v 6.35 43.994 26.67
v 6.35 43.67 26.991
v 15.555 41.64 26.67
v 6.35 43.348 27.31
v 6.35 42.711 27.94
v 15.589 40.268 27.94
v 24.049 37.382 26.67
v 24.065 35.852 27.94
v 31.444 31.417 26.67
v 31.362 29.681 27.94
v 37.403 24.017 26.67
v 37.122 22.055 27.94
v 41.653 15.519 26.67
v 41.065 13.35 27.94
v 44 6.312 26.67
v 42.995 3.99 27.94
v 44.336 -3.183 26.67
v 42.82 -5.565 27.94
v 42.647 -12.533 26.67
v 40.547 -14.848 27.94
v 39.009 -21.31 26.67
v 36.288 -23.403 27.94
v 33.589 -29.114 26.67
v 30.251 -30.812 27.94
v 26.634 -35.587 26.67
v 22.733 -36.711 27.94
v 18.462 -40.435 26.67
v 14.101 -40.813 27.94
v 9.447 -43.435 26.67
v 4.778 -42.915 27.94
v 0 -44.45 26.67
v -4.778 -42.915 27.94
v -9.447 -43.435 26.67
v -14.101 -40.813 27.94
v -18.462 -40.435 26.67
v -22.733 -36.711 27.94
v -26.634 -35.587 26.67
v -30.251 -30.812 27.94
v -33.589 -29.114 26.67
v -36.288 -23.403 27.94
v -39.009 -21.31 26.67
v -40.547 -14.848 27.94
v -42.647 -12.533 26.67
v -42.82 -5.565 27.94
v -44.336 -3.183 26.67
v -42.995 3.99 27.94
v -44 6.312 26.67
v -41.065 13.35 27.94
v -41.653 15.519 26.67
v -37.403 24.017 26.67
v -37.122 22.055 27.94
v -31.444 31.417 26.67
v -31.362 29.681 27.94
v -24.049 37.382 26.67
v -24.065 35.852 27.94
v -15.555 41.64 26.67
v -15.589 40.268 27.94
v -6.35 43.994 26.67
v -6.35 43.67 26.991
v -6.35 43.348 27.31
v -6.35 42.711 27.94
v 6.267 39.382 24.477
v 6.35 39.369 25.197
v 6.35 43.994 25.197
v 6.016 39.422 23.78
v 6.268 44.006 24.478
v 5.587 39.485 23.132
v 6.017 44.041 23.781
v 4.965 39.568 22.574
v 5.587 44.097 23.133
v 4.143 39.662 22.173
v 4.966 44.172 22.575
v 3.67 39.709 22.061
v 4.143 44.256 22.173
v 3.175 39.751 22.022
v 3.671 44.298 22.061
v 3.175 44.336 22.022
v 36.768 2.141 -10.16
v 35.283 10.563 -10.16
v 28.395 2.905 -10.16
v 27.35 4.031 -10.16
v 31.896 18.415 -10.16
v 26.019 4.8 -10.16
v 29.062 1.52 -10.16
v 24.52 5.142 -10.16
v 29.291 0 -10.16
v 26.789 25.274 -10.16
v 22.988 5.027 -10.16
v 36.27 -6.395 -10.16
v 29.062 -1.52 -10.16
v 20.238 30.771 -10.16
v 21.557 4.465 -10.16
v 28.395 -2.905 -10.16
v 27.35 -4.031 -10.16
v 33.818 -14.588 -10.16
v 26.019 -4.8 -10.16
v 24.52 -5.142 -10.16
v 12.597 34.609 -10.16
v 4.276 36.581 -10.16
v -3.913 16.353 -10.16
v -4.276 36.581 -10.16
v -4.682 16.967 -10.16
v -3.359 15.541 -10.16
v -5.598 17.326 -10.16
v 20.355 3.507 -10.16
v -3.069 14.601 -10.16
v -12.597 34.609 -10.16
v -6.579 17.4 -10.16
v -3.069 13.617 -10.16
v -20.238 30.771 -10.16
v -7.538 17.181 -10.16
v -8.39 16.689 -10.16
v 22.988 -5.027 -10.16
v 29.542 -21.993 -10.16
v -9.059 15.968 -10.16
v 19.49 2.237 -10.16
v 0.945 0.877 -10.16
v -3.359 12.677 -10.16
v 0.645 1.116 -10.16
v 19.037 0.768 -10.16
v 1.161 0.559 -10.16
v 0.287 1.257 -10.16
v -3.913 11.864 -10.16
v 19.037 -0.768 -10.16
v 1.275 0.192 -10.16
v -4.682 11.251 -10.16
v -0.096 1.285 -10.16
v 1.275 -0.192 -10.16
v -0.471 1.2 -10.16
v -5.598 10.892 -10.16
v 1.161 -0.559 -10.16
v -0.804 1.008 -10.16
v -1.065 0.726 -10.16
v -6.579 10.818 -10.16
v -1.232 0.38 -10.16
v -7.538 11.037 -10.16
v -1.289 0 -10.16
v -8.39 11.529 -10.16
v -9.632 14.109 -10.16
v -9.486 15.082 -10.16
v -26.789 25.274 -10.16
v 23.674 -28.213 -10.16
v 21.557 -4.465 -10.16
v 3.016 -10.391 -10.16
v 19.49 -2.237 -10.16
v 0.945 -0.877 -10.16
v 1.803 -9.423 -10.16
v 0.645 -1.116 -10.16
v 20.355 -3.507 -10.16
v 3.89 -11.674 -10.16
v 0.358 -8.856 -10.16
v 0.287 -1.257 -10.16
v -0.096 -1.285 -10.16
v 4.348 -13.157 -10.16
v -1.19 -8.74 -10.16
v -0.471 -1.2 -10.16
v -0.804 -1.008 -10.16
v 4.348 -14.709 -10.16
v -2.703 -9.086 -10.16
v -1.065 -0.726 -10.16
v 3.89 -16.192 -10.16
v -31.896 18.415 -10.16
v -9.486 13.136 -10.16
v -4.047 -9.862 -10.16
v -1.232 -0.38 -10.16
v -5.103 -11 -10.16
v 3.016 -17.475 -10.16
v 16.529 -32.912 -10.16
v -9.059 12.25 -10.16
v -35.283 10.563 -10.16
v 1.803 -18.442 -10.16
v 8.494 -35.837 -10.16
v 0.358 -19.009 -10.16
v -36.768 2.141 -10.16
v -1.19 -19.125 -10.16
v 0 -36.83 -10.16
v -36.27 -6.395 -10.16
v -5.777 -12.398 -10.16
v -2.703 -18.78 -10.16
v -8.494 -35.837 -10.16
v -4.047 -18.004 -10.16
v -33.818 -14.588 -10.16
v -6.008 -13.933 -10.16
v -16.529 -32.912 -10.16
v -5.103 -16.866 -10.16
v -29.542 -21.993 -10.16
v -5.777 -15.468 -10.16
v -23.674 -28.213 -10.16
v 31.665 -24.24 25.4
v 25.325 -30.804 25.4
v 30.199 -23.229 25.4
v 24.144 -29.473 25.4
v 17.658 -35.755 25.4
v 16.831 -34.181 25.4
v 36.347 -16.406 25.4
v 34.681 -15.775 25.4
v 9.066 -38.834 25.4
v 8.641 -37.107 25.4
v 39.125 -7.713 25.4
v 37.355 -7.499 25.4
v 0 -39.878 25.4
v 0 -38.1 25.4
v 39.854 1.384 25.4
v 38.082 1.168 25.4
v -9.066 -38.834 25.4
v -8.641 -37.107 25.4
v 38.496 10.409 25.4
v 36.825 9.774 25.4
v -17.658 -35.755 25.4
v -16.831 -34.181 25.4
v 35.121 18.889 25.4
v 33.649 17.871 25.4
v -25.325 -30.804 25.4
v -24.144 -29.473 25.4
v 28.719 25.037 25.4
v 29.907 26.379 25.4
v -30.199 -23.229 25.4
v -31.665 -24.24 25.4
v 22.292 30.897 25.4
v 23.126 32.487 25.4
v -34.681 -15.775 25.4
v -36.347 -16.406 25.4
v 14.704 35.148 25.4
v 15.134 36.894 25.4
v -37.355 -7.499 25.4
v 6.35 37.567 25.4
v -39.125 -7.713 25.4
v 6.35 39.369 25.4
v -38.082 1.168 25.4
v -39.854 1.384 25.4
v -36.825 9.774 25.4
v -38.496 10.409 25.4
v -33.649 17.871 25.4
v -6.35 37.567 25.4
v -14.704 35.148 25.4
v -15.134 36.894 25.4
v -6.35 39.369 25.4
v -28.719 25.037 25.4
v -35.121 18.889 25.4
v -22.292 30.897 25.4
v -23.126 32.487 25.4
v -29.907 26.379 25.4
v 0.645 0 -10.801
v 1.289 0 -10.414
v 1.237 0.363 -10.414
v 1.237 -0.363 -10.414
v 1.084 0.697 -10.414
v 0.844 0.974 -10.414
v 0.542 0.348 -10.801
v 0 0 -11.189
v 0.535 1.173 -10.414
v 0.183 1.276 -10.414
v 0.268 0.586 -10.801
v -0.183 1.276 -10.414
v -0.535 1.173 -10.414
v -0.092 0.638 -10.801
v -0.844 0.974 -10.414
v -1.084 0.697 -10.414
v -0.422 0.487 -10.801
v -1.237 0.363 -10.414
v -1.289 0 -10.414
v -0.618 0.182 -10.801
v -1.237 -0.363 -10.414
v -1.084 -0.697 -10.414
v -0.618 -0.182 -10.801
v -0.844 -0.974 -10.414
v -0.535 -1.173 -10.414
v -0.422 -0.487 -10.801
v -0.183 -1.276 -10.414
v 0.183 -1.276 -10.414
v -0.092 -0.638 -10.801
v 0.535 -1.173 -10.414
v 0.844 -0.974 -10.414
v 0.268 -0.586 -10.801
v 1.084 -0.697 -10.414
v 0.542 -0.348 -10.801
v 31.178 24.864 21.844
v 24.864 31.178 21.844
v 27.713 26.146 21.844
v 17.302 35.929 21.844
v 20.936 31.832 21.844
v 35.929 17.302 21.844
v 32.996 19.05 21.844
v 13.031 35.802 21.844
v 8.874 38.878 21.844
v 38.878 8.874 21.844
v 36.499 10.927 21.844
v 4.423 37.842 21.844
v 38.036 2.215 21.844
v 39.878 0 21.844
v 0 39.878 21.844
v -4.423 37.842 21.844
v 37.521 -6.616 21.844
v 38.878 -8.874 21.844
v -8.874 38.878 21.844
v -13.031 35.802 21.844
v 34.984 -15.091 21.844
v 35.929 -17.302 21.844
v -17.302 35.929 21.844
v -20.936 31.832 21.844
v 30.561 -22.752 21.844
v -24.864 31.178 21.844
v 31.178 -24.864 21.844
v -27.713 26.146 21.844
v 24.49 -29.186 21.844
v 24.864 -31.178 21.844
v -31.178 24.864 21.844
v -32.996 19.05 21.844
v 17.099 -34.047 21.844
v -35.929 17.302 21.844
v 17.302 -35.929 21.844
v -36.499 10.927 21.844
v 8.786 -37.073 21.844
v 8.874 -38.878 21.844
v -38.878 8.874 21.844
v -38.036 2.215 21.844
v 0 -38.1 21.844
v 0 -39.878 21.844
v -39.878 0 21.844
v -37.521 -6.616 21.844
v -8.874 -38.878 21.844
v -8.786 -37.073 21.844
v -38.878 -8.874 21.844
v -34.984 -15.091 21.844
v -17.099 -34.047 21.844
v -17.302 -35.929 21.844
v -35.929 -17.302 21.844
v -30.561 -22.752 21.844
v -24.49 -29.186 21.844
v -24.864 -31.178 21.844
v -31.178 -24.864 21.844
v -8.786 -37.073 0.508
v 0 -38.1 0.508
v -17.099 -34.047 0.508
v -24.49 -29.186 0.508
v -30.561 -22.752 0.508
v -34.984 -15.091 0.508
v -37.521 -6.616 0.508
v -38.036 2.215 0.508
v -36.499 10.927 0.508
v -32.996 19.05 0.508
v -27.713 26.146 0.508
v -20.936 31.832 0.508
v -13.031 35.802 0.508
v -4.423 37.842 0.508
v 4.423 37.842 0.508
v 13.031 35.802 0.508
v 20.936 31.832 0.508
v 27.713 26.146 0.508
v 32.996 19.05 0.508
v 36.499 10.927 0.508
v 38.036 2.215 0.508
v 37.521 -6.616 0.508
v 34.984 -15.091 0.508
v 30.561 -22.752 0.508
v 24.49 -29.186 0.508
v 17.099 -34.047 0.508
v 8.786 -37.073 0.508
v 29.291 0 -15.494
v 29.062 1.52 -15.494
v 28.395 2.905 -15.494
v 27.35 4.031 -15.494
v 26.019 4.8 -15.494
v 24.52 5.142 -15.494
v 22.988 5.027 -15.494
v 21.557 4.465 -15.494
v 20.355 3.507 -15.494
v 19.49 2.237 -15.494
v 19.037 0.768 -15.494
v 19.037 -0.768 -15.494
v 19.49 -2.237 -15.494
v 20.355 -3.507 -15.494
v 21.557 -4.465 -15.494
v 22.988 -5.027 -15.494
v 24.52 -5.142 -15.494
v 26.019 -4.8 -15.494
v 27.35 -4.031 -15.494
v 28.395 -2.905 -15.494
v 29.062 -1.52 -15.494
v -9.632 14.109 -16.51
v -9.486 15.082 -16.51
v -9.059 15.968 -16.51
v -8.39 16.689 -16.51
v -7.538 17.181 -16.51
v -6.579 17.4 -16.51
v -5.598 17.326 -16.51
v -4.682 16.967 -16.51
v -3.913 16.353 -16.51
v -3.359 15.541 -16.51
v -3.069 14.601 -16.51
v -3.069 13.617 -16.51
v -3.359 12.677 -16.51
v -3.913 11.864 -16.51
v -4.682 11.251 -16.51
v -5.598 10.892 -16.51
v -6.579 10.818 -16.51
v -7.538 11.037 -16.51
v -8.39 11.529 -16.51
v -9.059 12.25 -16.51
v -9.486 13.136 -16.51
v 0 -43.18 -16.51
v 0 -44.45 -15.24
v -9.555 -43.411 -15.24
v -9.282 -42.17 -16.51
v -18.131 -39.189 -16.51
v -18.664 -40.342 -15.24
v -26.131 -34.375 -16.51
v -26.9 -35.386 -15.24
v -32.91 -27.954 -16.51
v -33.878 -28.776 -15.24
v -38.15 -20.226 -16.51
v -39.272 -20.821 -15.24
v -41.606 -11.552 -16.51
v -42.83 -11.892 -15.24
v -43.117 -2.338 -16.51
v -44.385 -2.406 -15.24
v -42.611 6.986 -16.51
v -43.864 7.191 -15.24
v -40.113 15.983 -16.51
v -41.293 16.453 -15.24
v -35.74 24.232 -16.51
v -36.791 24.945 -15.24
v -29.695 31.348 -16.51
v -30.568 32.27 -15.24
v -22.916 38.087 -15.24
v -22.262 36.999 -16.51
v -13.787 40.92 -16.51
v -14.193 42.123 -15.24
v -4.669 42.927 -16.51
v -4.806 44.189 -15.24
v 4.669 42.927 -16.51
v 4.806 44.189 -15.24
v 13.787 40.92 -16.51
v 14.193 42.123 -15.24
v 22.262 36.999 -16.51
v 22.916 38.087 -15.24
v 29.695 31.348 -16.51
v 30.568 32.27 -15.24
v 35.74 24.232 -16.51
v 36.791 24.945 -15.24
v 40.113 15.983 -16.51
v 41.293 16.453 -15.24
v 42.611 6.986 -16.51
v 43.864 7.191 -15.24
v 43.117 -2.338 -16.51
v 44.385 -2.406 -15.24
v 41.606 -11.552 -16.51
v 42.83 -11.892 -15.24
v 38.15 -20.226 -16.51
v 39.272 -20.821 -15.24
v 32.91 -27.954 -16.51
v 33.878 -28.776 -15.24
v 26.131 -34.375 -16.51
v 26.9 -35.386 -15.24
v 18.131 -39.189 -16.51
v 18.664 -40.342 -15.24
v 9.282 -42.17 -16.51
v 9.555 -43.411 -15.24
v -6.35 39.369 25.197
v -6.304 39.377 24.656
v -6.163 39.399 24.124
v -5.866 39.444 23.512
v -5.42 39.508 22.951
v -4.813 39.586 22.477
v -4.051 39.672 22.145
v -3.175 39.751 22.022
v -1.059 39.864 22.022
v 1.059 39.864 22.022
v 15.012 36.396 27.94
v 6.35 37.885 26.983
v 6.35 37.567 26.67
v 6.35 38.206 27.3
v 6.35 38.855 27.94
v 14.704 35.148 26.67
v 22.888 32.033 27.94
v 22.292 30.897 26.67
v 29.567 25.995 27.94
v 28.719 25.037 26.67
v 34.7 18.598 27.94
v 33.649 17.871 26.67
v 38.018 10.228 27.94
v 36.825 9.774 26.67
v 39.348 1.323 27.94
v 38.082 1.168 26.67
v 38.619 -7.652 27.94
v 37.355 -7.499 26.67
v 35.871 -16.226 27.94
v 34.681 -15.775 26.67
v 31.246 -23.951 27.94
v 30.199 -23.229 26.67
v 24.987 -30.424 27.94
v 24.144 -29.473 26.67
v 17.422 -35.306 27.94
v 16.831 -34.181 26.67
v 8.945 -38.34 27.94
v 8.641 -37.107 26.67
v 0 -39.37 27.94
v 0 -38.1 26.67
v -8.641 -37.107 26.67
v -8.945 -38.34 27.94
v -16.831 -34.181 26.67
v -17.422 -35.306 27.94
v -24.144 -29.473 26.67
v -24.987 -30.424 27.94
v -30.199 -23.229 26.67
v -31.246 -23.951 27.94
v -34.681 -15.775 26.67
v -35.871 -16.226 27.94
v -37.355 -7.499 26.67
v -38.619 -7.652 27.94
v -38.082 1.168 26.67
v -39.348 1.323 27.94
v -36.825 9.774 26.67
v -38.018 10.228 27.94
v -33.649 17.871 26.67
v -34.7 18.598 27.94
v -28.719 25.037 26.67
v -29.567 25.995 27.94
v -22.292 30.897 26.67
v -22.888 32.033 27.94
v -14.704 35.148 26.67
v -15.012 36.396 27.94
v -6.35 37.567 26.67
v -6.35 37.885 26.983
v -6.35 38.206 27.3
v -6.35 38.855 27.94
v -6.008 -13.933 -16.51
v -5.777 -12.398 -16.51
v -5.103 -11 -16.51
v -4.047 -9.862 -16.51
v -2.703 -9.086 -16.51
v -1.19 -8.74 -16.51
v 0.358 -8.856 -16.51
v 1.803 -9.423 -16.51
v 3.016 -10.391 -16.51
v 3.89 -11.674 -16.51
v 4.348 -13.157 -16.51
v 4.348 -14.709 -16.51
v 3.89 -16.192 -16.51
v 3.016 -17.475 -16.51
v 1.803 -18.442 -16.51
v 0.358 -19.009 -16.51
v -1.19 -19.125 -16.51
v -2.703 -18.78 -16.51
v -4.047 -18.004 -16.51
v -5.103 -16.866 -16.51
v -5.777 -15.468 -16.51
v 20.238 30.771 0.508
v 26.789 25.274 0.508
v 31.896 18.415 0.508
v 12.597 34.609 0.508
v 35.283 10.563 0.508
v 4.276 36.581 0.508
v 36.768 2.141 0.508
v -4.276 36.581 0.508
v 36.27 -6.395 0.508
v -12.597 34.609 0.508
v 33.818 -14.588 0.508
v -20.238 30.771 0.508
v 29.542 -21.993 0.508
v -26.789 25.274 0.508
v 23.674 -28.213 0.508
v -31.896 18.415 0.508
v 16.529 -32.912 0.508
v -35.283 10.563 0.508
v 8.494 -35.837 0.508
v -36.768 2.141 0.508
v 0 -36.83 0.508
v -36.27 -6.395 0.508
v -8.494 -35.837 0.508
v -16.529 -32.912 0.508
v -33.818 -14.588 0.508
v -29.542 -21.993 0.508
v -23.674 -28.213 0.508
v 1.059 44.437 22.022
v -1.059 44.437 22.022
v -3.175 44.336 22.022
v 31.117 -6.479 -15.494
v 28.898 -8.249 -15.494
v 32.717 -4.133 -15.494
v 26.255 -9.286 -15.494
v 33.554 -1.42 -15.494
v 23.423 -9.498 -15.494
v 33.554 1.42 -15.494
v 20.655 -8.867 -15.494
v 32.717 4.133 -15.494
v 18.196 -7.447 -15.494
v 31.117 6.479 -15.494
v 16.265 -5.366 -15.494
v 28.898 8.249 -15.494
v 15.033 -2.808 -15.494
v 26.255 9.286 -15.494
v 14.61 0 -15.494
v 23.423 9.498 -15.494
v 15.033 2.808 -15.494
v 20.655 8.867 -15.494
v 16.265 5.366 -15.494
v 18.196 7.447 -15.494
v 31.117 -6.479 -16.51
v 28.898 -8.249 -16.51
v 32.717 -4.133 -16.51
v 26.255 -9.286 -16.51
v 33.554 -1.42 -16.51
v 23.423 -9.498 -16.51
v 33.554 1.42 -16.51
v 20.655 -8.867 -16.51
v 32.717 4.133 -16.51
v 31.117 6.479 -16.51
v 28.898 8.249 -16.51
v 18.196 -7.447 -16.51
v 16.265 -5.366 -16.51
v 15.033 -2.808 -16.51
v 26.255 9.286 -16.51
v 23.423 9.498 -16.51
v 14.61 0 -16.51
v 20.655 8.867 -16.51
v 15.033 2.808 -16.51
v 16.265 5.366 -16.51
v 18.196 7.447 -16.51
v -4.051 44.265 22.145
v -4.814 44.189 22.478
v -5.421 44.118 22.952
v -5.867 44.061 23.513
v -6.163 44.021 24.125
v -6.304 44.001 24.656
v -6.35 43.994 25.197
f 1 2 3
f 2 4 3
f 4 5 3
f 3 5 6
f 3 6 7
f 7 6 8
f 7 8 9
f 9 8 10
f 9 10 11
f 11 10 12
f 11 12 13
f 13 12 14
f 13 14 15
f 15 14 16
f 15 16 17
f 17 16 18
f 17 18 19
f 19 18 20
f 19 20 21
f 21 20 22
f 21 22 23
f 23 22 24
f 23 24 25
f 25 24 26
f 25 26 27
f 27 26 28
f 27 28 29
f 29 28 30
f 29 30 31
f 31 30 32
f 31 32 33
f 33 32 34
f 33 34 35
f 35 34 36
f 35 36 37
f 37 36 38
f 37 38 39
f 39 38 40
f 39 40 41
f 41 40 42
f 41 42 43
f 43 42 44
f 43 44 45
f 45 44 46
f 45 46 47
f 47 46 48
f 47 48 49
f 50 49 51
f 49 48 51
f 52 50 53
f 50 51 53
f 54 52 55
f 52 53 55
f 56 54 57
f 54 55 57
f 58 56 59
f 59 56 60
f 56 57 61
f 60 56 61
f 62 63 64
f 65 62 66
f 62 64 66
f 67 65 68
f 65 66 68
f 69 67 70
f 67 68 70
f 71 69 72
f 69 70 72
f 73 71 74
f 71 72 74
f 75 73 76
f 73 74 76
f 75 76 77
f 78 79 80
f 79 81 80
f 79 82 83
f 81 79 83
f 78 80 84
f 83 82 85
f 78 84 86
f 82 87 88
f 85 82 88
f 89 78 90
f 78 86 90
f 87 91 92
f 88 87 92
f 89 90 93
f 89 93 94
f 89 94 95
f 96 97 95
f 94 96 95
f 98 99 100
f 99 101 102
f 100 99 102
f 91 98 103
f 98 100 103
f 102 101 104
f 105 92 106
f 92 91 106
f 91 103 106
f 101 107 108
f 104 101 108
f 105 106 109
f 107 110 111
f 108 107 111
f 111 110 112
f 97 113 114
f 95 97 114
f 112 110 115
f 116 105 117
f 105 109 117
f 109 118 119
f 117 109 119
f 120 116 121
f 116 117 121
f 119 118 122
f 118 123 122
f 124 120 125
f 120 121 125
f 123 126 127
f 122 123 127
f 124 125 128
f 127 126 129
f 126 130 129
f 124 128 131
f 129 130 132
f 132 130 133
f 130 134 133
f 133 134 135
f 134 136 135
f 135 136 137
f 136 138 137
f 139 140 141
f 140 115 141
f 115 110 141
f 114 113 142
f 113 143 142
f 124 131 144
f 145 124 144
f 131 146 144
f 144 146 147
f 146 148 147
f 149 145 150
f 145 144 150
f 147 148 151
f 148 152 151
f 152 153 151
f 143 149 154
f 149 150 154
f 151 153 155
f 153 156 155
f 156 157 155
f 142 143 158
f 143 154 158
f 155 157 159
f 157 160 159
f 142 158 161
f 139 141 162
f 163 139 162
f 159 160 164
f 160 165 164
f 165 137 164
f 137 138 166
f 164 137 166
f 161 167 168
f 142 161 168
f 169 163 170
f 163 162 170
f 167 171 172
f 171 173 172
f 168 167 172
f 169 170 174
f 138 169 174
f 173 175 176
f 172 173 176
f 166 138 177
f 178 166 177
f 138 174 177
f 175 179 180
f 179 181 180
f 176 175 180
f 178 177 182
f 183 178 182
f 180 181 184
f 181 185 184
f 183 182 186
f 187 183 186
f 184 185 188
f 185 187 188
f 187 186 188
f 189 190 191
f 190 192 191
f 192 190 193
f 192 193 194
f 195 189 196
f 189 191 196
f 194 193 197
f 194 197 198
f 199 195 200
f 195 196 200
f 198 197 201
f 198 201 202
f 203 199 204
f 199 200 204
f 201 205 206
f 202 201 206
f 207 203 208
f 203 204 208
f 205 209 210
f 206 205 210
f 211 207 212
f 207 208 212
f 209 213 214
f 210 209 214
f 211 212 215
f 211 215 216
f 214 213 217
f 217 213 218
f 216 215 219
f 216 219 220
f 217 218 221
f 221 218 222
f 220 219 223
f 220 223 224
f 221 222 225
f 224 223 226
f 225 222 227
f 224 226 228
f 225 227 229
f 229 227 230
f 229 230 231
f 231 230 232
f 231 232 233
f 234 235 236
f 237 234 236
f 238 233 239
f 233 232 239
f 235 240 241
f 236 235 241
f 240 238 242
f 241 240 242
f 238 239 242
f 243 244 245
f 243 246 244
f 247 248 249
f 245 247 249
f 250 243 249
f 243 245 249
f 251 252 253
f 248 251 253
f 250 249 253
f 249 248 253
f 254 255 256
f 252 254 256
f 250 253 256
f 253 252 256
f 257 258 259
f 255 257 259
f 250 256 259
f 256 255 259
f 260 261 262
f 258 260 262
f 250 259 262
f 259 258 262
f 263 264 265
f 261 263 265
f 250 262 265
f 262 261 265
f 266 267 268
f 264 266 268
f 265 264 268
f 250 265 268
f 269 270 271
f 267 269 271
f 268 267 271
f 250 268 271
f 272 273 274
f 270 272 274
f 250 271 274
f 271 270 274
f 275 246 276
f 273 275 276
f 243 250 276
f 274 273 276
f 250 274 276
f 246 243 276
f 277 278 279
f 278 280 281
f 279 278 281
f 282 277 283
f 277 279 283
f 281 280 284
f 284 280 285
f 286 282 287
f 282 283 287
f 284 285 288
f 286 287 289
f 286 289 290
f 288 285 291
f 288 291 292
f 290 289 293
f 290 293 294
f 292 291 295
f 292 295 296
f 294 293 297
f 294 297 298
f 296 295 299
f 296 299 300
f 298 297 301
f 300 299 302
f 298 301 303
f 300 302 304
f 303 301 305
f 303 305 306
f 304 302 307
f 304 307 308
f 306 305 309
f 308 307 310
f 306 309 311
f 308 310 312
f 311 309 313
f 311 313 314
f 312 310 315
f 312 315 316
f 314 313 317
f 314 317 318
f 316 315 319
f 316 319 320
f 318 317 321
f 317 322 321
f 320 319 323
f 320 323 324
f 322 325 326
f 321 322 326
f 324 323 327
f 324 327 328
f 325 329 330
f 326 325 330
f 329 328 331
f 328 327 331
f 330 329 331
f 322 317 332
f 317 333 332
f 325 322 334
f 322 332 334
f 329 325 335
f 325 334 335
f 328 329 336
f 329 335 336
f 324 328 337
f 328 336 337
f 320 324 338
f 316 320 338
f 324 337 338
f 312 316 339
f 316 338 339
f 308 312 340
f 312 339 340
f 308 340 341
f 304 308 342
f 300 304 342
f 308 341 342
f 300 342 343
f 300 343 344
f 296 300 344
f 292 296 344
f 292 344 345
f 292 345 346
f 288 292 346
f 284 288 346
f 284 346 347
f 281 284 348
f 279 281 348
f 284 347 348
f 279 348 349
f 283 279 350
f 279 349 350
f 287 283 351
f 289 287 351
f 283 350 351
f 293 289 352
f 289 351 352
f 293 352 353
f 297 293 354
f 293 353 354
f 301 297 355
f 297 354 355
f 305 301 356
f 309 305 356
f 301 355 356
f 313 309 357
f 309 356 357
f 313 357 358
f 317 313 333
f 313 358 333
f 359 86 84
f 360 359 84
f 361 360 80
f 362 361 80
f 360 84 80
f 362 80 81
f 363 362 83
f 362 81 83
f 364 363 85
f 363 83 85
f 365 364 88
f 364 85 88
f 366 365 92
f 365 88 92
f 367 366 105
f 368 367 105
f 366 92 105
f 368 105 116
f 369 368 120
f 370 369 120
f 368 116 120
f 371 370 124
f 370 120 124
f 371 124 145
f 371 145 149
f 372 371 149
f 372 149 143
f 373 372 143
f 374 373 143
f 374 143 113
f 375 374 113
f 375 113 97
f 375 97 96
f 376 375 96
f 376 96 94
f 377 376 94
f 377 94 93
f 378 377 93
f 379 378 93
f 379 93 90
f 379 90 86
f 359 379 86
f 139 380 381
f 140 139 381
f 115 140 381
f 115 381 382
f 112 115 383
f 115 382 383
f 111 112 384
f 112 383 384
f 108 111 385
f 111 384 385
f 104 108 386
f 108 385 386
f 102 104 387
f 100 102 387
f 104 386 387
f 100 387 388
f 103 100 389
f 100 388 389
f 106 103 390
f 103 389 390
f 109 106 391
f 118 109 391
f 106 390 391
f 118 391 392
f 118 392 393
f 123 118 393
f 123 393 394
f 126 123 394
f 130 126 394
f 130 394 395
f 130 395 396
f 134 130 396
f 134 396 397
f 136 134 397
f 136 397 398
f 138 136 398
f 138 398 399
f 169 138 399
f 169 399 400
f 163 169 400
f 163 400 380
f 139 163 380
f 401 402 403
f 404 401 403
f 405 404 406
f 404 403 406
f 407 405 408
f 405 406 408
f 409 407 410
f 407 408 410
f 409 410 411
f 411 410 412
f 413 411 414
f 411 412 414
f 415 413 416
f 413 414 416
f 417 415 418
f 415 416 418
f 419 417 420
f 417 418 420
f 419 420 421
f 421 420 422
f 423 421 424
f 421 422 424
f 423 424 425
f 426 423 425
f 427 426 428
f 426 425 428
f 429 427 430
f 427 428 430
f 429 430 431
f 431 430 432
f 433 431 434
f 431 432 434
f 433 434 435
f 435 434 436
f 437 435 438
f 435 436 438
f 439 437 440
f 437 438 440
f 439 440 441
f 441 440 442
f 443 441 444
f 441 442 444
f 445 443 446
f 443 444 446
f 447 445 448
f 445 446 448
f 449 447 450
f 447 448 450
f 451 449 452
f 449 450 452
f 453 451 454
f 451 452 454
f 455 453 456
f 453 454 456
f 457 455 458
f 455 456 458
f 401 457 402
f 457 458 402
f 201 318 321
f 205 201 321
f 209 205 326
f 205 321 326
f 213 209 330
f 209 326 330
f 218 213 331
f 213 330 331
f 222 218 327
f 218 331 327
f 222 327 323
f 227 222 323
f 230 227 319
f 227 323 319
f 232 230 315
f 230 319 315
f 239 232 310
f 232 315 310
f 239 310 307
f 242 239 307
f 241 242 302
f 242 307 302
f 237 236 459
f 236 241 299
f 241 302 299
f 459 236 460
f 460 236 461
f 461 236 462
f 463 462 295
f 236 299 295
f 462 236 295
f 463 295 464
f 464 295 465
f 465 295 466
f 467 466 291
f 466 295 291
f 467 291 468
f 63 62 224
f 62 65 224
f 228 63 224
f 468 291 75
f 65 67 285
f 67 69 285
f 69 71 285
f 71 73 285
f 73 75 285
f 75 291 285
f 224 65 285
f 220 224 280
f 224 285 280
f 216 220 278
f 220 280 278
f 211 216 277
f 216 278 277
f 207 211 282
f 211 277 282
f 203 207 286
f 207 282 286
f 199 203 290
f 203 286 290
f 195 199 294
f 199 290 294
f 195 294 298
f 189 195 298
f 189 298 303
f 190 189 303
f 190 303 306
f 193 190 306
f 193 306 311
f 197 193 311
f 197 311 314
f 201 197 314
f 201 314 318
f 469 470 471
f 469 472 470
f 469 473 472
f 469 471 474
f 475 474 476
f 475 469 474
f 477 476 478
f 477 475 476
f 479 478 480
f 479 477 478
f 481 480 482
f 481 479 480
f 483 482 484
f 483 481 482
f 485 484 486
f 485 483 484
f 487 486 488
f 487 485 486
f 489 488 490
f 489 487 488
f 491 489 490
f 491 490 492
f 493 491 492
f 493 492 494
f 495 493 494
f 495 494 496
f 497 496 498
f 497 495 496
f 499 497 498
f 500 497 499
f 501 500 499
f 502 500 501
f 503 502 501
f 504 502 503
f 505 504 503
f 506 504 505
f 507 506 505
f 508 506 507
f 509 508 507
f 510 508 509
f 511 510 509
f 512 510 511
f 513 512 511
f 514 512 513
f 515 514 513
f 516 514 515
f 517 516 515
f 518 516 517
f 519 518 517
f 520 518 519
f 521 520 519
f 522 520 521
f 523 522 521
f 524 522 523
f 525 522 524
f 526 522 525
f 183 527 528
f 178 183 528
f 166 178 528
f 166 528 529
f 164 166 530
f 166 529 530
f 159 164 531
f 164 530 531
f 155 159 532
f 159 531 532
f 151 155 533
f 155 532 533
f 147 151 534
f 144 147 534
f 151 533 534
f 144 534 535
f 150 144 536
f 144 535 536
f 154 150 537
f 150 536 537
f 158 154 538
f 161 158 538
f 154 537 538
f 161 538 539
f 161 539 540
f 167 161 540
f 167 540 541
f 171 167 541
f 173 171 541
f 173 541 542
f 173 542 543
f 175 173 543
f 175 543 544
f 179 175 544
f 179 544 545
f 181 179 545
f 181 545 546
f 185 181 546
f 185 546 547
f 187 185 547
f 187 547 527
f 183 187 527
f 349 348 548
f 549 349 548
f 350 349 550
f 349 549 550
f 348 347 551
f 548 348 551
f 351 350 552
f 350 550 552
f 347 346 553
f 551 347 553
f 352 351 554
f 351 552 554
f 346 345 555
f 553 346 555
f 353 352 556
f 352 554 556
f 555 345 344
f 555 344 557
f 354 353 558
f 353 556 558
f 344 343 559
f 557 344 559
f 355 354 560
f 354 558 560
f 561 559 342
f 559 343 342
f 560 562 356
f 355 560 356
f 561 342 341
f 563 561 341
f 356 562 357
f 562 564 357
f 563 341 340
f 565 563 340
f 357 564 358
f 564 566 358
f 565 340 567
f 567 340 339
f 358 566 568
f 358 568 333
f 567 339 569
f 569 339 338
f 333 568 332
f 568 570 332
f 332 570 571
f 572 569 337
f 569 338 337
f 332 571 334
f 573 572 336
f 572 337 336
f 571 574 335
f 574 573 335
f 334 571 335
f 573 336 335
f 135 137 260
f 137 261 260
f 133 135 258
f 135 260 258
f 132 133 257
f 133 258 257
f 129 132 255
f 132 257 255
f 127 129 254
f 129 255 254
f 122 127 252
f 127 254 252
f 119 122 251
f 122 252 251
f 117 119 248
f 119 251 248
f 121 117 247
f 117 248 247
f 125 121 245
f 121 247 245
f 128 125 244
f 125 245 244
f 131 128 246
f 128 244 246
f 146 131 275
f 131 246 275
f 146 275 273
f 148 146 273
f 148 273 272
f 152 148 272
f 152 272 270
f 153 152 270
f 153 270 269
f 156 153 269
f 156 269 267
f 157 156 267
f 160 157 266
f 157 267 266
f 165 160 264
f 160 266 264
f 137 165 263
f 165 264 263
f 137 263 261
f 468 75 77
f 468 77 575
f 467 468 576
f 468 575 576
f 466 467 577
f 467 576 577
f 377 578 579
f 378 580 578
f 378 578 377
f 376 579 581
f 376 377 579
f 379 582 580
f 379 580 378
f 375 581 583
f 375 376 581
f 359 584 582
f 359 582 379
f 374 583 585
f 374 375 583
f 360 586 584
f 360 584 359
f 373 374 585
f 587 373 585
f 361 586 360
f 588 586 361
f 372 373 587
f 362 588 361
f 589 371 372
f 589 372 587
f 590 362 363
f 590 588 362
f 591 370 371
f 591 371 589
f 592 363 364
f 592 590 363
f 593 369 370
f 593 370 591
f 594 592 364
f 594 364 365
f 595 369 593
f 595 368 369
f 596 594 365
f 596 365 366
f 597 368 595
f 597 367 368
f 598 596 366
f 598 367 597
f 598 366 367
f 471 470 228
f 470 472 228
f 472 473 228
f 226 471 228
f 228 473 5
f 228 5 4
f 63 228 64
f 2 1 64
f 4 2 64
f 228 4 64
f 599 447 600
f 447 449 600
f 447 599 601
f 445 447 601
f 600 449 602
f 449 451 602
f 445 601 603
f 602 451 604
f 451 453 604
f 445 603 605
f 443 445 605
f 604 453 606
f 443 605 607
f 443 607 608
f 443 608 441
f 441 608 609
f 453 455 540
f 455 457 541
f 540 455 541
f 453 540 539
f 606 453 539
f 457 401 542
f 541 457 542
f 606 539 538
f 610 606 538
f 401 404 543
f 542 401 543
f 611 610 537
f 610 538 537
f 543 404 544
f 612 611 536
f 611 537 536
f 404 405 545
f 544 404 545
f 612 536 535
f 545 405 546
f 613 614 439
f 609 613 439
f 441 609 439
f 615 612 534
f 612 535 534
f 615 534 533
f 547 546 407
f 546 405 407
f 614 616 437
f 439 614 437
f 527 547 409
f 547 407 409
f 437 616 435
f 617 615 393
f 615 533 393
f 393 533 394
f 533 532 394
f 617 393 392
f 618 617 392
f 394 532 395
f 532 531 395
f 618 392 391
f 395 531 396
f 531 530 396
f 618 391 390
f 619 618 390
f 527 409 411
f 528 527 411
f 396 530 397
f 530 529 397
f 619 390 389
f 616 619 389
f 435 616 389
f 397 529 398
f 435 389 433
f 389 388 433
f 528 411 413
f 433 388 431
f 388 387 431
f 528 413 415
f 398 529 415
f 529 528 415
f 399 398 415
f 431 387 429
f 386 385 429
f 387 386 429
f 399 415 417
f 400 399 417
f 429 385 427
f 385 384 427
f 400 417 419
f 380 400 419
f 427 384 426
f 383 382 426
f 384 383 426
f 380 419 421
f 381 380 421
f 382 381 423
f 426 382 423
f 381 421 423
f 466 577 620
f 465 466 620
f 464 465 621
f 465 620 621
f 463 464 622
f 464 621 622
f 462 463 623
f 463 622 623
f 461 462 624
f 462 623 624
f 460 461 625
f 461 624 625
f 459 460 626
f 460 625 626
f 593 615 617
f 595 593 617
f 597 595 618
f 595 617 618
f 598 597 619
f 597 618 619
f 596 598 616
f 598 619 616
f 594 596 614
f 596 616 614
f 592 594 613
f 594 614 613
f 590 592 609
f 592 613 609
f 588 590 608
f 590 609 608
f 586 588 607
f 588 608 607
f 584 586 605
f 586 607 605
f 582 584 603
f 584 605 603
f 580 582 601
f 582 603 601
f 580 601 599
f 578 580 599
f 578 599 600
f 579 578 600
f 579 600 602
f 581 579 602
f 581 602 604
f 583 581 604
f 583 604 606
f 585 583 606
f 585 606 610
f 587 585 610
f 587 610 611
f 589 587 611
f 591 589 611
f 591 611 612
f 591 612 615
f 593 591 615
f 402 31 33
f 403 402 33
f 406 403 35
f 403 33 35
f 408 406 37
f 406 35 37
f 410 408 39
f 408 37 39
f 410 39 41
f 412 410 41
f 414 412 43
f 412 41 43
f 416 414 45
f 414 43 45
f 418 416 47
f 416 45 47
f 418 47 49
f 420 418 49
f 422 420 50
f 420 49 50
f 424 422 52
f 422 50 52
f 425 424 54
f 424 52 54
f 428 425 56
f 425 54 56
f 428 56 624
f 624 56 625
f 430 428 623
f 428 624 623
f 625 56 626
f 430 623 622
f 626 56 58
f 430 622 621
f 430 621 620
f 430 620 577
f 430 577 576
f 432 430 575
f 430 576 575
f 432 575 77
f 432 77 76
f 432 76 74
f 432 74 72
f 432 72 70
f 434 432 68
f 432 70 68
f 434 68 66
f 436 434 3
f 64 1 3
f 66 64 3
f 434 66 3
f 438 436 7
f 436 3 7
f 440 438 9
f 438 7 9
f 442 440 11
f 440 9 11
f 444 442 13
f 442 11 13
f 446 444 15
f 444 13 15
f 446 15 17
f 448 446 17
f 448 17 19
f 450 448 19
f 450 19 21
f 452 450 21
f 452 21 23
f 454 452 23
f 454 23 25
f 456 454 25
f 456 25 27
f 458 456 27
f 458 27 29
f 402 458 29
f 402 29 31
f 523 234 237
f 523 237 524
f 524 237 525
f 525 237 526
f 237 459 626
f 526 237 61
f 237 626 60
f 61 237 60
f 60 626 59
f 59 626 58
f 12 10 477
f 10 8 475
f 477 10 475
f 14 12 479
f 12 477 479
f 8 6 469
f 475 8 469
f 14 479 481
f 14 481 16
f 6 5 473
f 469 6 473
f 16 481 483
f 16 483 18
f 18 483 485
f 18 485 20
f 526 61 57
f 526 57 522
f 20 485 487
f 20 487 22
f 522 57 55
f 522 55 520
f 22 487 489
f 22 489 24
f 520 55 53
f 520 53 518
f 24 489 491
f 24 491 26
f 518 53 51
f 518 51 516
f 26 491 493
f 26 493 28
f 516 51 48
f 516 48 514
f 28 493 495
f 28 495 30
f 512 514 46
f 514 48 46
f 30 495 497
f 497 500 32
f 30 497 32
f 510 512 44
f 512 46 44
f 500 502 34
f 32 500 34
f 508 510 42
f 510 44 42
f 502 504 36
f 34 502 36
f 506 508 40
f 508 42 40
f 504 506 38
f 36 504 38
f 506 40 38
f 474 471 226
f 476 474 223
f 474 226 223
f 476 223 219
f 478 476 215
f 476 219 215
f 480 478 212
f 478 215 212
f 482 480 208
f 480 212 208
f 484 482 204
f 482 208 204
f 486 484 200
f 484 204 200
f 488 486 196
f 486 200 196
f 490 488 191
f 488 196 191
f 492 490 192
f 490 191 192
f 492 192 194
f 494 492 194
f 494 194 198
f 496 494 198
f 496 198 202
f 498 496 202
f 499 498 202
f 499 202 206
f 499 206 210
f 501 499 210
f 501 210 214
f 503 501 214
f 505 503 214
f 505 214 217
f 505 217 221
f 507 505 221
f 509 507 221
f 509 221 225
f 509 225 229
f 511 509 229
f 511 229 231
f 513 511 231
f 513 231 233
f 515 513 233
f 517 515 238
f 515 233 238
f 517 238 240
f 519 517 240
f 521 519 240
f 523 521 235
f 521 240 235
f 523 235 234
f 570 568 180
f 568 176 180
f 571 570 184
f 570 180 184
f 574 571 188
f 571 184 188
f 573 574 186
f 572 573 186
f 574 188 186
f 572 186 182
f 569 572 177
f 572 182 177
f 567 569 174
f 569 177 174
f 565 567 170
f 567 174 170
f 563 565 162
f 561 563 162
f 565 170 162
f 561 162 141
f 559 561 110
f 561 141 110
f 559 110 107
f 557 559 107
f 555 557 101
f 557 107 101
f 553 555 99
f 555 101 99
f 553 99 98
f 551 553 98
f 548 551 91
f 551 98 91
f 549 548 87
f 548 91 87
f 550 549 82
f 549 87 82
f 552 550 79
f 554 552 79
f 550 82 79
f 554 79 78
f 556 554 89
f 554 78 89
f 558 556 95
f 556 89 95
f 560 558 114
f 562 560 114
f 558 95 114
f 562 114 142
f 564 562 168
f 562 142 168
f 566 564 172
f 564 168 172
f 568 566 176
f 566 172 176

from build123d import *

# Parameters (mm, degrees)
CUT_EXTRUDE1_REACH                                   = 90.9
CHAMFER2_SIZE                                        = 1.27
CHAMFER3_SIZE                                        = 1.27
F_38_0_1015_DIAMETER_HOLE1_D                         = 2.5781
F_38_0_1015_DIAMETER_HOLE1_DEPTH                     = 0.254
F_38_0_1015_DIAMETER_HOLE1_TIP                       = 0.774539381
CBORE_FOR_3_8_BINDING_HEAD_MACHINE_SCREW_D           = 10.3124
CBORE_FOR_3_8_BINDING_HEAD_MACHINE_SCREW_DEPTH       = 6.35
CBORE_FOR_3_8_BINDING_HEAD_MACHINE_SCREW_CBORE_D     = 19.05
CBORE_FOR_3_8_BINDING_HEAD_MACHINE_SCREW_CBORE_DEPTH = 1.016
CUT_EXTRUDE3_REACH                                   = 46.45
SKETCH16_R                                           = 5.207
SKETCH16_R_2                                         = 3.3


with BuildPart() as part:
    # Sketch1 → Revolve1 (revolve)
    with BuildSketch(Plane(origin=(0, 0, 0), x_dir=(0, 0, -1), z_dir=(1, 0, 0))):
        Polygon((10.16, 0), (16.51, 0), (16.51, -44.45), (-27.94, -44.45), (-27.94, -38.1), (-25.4, -38.1), (-25.4, -39.878), (-21.844, -39.878), (-21.844, -38.1), (-0.508, -38.1), (-0.508, -36.83), (10.16, -36.83), align=None)
    revolve(axis=Axis((0, 0, 77.403157895), (0, 0, -1)))

    # Sketch2 → Cut-Extrude1 (cut, up to next)
    with BuildSketch(Plane(origin=(0, 44.45, 0), x_dir=(1, 0, 0), z_dir=(0, 1, 0)), mode=Mode.PRIVATE) as cut_extrude1_sk1:
        with BuildLine():
            Line((-6.35, -27.94), (6.35, -27.94))
            Line((6.35, -27.94), (6.35, -25.1968))
            ThreePointArc((6.35, -25.1968), (5.42006403, -22.95173597), (3.175, -22.0218))
            Line((3.175, -22.0218), (-3.175, -22.0218))
            ThreePointArc((-3.175, -22.0218), (-5.42006403, -22.95173597), (-6.35, -25.1968))
            Line((-6.35, -25.1968), (-6.35, -27.94))
        make_face()
    cut_extrude1_tool1 = extrude(cut_extrude1_sk1.sketch, amount=-CUT_EXTRUDE1_REACH, mode=Mode.PRIVATE) & part.part
    add(cut_extrude1_tool1.solids().sort_by_distance((0, 44.45, 25.118327))[0], mode=Mode.SUBTRACT)

    # Chamfer2
    chamfer2_edges = [part.edges().sort_by_distance(p)[0] for p in [
        (0, 44.45, -16.51),
        (-44.335876123, -3.183172689, 27.94),
    ]]
    chamfer(chamfer2_edges, length=CHAMFER2_SIZE)

    # Chamfer3
    chamfer3_edges = [part.edges().sort_by_distance(p)[0] for p in [
        (0, -38.1, 27.94),
    ]]
    chamfer(chamfer3_edges, length=CHAMFER3_SIZE)

    # #38 (0.1015) Diameter Hole1
    with Locations(Plane.XY.offset(-10.16)):
        with Locations((0, 0)):
            Hole(F_38_0_1015_DIAMETER_HOLE1_D / 2, depth=F_38_0_1015_DIAMETER_HOLE1_DEPTH)
            with Locations((0, 0, -(F_38_0_1015_DIAMETER_HOLE1_DEPTH + F_38_0_1015_DIAMETER_HOLE1_TIP / 2))):  # 118° drill point
                Cone(0, F_38_0_1015_DIAMETER_HOLE1_D / 2, F_38_0_1015_DIAMETER_HOLE1_TIP, mode=Mode.SUBTRACT)

    # CBORE for 3/8 Binding Head Machine Screw1
    with Locations(Plane(origin=(0, 0, -16.51), x_dir=(-1, 0, 0), z_dir=(0, 0, -1))):
        with Locations((-24.13512246, 0)):
            CounterBoreHole(CBORE_FOR_3_8_BINDING_HEAD_MACHINE_SCREW_D / 2, CBORE_FOR_3_8_BINDING_HEAD_MACHINE_SCREW_CBORE_D / 2, CBORE_FOR_3_8_BINDING_HEAD_MACHINE_SCREW_CBORE_DEPTH, depth=CBORE_FOR_3_8_BINDING_HEAD_MACHINE_SCREW_DEPTH)

    # Sketch16 → Cut-Extrude3 (cut, up to next)
    with BuildSketch(Plane(origin=(0, 0, -16.51), x_dir=(-1, 0, 0), z_dir=(0, 0, -1)), mode=Mode.PRIVATE) as cut_extrude3_sk1:
        with Locations((0.800871739, -13.932849809)):
            Circle(SKETCH16_R)
    cut_extrude3_tool1 = extrude(cut_extrude3_sk1.sketch, amount=-CUT_EXTRUDE3_REACH, mode=Mode.PRIVATE) & part.part
    add(cut_extrude3_tool1.solids().sort_by_distance((-0.800872, -13.93285, -16.51))[0], mode=Mode.SUBTRACT)
    # Sketch16 → Cut-Extrude3 (cut, up to next)
    with BuildSketch(Plane(origin=(0, 0, -16.51), x_dir=(-1, 0, 0), z_dir=(0, 0, -1)), mode=Mode.PRIVATE) as cut_extrude3_sk2:
        with Locations((6.332326955, 14.108828715)):
            Circle(SKETCH16_R_2)
    cut_extrude3_tool2 = extrude(cut_extrude3_sk2.sketch, amount=-CUT_EXTRUDE3_REACH, mode=Mode.PRIVATE) & part.part
    add(cut_extrude3_tool2.solids().sort_by_distance((-6.332327, 14.108829, -16.51))[0], mode=Mode.SUBTRACT)


solid = part.part
